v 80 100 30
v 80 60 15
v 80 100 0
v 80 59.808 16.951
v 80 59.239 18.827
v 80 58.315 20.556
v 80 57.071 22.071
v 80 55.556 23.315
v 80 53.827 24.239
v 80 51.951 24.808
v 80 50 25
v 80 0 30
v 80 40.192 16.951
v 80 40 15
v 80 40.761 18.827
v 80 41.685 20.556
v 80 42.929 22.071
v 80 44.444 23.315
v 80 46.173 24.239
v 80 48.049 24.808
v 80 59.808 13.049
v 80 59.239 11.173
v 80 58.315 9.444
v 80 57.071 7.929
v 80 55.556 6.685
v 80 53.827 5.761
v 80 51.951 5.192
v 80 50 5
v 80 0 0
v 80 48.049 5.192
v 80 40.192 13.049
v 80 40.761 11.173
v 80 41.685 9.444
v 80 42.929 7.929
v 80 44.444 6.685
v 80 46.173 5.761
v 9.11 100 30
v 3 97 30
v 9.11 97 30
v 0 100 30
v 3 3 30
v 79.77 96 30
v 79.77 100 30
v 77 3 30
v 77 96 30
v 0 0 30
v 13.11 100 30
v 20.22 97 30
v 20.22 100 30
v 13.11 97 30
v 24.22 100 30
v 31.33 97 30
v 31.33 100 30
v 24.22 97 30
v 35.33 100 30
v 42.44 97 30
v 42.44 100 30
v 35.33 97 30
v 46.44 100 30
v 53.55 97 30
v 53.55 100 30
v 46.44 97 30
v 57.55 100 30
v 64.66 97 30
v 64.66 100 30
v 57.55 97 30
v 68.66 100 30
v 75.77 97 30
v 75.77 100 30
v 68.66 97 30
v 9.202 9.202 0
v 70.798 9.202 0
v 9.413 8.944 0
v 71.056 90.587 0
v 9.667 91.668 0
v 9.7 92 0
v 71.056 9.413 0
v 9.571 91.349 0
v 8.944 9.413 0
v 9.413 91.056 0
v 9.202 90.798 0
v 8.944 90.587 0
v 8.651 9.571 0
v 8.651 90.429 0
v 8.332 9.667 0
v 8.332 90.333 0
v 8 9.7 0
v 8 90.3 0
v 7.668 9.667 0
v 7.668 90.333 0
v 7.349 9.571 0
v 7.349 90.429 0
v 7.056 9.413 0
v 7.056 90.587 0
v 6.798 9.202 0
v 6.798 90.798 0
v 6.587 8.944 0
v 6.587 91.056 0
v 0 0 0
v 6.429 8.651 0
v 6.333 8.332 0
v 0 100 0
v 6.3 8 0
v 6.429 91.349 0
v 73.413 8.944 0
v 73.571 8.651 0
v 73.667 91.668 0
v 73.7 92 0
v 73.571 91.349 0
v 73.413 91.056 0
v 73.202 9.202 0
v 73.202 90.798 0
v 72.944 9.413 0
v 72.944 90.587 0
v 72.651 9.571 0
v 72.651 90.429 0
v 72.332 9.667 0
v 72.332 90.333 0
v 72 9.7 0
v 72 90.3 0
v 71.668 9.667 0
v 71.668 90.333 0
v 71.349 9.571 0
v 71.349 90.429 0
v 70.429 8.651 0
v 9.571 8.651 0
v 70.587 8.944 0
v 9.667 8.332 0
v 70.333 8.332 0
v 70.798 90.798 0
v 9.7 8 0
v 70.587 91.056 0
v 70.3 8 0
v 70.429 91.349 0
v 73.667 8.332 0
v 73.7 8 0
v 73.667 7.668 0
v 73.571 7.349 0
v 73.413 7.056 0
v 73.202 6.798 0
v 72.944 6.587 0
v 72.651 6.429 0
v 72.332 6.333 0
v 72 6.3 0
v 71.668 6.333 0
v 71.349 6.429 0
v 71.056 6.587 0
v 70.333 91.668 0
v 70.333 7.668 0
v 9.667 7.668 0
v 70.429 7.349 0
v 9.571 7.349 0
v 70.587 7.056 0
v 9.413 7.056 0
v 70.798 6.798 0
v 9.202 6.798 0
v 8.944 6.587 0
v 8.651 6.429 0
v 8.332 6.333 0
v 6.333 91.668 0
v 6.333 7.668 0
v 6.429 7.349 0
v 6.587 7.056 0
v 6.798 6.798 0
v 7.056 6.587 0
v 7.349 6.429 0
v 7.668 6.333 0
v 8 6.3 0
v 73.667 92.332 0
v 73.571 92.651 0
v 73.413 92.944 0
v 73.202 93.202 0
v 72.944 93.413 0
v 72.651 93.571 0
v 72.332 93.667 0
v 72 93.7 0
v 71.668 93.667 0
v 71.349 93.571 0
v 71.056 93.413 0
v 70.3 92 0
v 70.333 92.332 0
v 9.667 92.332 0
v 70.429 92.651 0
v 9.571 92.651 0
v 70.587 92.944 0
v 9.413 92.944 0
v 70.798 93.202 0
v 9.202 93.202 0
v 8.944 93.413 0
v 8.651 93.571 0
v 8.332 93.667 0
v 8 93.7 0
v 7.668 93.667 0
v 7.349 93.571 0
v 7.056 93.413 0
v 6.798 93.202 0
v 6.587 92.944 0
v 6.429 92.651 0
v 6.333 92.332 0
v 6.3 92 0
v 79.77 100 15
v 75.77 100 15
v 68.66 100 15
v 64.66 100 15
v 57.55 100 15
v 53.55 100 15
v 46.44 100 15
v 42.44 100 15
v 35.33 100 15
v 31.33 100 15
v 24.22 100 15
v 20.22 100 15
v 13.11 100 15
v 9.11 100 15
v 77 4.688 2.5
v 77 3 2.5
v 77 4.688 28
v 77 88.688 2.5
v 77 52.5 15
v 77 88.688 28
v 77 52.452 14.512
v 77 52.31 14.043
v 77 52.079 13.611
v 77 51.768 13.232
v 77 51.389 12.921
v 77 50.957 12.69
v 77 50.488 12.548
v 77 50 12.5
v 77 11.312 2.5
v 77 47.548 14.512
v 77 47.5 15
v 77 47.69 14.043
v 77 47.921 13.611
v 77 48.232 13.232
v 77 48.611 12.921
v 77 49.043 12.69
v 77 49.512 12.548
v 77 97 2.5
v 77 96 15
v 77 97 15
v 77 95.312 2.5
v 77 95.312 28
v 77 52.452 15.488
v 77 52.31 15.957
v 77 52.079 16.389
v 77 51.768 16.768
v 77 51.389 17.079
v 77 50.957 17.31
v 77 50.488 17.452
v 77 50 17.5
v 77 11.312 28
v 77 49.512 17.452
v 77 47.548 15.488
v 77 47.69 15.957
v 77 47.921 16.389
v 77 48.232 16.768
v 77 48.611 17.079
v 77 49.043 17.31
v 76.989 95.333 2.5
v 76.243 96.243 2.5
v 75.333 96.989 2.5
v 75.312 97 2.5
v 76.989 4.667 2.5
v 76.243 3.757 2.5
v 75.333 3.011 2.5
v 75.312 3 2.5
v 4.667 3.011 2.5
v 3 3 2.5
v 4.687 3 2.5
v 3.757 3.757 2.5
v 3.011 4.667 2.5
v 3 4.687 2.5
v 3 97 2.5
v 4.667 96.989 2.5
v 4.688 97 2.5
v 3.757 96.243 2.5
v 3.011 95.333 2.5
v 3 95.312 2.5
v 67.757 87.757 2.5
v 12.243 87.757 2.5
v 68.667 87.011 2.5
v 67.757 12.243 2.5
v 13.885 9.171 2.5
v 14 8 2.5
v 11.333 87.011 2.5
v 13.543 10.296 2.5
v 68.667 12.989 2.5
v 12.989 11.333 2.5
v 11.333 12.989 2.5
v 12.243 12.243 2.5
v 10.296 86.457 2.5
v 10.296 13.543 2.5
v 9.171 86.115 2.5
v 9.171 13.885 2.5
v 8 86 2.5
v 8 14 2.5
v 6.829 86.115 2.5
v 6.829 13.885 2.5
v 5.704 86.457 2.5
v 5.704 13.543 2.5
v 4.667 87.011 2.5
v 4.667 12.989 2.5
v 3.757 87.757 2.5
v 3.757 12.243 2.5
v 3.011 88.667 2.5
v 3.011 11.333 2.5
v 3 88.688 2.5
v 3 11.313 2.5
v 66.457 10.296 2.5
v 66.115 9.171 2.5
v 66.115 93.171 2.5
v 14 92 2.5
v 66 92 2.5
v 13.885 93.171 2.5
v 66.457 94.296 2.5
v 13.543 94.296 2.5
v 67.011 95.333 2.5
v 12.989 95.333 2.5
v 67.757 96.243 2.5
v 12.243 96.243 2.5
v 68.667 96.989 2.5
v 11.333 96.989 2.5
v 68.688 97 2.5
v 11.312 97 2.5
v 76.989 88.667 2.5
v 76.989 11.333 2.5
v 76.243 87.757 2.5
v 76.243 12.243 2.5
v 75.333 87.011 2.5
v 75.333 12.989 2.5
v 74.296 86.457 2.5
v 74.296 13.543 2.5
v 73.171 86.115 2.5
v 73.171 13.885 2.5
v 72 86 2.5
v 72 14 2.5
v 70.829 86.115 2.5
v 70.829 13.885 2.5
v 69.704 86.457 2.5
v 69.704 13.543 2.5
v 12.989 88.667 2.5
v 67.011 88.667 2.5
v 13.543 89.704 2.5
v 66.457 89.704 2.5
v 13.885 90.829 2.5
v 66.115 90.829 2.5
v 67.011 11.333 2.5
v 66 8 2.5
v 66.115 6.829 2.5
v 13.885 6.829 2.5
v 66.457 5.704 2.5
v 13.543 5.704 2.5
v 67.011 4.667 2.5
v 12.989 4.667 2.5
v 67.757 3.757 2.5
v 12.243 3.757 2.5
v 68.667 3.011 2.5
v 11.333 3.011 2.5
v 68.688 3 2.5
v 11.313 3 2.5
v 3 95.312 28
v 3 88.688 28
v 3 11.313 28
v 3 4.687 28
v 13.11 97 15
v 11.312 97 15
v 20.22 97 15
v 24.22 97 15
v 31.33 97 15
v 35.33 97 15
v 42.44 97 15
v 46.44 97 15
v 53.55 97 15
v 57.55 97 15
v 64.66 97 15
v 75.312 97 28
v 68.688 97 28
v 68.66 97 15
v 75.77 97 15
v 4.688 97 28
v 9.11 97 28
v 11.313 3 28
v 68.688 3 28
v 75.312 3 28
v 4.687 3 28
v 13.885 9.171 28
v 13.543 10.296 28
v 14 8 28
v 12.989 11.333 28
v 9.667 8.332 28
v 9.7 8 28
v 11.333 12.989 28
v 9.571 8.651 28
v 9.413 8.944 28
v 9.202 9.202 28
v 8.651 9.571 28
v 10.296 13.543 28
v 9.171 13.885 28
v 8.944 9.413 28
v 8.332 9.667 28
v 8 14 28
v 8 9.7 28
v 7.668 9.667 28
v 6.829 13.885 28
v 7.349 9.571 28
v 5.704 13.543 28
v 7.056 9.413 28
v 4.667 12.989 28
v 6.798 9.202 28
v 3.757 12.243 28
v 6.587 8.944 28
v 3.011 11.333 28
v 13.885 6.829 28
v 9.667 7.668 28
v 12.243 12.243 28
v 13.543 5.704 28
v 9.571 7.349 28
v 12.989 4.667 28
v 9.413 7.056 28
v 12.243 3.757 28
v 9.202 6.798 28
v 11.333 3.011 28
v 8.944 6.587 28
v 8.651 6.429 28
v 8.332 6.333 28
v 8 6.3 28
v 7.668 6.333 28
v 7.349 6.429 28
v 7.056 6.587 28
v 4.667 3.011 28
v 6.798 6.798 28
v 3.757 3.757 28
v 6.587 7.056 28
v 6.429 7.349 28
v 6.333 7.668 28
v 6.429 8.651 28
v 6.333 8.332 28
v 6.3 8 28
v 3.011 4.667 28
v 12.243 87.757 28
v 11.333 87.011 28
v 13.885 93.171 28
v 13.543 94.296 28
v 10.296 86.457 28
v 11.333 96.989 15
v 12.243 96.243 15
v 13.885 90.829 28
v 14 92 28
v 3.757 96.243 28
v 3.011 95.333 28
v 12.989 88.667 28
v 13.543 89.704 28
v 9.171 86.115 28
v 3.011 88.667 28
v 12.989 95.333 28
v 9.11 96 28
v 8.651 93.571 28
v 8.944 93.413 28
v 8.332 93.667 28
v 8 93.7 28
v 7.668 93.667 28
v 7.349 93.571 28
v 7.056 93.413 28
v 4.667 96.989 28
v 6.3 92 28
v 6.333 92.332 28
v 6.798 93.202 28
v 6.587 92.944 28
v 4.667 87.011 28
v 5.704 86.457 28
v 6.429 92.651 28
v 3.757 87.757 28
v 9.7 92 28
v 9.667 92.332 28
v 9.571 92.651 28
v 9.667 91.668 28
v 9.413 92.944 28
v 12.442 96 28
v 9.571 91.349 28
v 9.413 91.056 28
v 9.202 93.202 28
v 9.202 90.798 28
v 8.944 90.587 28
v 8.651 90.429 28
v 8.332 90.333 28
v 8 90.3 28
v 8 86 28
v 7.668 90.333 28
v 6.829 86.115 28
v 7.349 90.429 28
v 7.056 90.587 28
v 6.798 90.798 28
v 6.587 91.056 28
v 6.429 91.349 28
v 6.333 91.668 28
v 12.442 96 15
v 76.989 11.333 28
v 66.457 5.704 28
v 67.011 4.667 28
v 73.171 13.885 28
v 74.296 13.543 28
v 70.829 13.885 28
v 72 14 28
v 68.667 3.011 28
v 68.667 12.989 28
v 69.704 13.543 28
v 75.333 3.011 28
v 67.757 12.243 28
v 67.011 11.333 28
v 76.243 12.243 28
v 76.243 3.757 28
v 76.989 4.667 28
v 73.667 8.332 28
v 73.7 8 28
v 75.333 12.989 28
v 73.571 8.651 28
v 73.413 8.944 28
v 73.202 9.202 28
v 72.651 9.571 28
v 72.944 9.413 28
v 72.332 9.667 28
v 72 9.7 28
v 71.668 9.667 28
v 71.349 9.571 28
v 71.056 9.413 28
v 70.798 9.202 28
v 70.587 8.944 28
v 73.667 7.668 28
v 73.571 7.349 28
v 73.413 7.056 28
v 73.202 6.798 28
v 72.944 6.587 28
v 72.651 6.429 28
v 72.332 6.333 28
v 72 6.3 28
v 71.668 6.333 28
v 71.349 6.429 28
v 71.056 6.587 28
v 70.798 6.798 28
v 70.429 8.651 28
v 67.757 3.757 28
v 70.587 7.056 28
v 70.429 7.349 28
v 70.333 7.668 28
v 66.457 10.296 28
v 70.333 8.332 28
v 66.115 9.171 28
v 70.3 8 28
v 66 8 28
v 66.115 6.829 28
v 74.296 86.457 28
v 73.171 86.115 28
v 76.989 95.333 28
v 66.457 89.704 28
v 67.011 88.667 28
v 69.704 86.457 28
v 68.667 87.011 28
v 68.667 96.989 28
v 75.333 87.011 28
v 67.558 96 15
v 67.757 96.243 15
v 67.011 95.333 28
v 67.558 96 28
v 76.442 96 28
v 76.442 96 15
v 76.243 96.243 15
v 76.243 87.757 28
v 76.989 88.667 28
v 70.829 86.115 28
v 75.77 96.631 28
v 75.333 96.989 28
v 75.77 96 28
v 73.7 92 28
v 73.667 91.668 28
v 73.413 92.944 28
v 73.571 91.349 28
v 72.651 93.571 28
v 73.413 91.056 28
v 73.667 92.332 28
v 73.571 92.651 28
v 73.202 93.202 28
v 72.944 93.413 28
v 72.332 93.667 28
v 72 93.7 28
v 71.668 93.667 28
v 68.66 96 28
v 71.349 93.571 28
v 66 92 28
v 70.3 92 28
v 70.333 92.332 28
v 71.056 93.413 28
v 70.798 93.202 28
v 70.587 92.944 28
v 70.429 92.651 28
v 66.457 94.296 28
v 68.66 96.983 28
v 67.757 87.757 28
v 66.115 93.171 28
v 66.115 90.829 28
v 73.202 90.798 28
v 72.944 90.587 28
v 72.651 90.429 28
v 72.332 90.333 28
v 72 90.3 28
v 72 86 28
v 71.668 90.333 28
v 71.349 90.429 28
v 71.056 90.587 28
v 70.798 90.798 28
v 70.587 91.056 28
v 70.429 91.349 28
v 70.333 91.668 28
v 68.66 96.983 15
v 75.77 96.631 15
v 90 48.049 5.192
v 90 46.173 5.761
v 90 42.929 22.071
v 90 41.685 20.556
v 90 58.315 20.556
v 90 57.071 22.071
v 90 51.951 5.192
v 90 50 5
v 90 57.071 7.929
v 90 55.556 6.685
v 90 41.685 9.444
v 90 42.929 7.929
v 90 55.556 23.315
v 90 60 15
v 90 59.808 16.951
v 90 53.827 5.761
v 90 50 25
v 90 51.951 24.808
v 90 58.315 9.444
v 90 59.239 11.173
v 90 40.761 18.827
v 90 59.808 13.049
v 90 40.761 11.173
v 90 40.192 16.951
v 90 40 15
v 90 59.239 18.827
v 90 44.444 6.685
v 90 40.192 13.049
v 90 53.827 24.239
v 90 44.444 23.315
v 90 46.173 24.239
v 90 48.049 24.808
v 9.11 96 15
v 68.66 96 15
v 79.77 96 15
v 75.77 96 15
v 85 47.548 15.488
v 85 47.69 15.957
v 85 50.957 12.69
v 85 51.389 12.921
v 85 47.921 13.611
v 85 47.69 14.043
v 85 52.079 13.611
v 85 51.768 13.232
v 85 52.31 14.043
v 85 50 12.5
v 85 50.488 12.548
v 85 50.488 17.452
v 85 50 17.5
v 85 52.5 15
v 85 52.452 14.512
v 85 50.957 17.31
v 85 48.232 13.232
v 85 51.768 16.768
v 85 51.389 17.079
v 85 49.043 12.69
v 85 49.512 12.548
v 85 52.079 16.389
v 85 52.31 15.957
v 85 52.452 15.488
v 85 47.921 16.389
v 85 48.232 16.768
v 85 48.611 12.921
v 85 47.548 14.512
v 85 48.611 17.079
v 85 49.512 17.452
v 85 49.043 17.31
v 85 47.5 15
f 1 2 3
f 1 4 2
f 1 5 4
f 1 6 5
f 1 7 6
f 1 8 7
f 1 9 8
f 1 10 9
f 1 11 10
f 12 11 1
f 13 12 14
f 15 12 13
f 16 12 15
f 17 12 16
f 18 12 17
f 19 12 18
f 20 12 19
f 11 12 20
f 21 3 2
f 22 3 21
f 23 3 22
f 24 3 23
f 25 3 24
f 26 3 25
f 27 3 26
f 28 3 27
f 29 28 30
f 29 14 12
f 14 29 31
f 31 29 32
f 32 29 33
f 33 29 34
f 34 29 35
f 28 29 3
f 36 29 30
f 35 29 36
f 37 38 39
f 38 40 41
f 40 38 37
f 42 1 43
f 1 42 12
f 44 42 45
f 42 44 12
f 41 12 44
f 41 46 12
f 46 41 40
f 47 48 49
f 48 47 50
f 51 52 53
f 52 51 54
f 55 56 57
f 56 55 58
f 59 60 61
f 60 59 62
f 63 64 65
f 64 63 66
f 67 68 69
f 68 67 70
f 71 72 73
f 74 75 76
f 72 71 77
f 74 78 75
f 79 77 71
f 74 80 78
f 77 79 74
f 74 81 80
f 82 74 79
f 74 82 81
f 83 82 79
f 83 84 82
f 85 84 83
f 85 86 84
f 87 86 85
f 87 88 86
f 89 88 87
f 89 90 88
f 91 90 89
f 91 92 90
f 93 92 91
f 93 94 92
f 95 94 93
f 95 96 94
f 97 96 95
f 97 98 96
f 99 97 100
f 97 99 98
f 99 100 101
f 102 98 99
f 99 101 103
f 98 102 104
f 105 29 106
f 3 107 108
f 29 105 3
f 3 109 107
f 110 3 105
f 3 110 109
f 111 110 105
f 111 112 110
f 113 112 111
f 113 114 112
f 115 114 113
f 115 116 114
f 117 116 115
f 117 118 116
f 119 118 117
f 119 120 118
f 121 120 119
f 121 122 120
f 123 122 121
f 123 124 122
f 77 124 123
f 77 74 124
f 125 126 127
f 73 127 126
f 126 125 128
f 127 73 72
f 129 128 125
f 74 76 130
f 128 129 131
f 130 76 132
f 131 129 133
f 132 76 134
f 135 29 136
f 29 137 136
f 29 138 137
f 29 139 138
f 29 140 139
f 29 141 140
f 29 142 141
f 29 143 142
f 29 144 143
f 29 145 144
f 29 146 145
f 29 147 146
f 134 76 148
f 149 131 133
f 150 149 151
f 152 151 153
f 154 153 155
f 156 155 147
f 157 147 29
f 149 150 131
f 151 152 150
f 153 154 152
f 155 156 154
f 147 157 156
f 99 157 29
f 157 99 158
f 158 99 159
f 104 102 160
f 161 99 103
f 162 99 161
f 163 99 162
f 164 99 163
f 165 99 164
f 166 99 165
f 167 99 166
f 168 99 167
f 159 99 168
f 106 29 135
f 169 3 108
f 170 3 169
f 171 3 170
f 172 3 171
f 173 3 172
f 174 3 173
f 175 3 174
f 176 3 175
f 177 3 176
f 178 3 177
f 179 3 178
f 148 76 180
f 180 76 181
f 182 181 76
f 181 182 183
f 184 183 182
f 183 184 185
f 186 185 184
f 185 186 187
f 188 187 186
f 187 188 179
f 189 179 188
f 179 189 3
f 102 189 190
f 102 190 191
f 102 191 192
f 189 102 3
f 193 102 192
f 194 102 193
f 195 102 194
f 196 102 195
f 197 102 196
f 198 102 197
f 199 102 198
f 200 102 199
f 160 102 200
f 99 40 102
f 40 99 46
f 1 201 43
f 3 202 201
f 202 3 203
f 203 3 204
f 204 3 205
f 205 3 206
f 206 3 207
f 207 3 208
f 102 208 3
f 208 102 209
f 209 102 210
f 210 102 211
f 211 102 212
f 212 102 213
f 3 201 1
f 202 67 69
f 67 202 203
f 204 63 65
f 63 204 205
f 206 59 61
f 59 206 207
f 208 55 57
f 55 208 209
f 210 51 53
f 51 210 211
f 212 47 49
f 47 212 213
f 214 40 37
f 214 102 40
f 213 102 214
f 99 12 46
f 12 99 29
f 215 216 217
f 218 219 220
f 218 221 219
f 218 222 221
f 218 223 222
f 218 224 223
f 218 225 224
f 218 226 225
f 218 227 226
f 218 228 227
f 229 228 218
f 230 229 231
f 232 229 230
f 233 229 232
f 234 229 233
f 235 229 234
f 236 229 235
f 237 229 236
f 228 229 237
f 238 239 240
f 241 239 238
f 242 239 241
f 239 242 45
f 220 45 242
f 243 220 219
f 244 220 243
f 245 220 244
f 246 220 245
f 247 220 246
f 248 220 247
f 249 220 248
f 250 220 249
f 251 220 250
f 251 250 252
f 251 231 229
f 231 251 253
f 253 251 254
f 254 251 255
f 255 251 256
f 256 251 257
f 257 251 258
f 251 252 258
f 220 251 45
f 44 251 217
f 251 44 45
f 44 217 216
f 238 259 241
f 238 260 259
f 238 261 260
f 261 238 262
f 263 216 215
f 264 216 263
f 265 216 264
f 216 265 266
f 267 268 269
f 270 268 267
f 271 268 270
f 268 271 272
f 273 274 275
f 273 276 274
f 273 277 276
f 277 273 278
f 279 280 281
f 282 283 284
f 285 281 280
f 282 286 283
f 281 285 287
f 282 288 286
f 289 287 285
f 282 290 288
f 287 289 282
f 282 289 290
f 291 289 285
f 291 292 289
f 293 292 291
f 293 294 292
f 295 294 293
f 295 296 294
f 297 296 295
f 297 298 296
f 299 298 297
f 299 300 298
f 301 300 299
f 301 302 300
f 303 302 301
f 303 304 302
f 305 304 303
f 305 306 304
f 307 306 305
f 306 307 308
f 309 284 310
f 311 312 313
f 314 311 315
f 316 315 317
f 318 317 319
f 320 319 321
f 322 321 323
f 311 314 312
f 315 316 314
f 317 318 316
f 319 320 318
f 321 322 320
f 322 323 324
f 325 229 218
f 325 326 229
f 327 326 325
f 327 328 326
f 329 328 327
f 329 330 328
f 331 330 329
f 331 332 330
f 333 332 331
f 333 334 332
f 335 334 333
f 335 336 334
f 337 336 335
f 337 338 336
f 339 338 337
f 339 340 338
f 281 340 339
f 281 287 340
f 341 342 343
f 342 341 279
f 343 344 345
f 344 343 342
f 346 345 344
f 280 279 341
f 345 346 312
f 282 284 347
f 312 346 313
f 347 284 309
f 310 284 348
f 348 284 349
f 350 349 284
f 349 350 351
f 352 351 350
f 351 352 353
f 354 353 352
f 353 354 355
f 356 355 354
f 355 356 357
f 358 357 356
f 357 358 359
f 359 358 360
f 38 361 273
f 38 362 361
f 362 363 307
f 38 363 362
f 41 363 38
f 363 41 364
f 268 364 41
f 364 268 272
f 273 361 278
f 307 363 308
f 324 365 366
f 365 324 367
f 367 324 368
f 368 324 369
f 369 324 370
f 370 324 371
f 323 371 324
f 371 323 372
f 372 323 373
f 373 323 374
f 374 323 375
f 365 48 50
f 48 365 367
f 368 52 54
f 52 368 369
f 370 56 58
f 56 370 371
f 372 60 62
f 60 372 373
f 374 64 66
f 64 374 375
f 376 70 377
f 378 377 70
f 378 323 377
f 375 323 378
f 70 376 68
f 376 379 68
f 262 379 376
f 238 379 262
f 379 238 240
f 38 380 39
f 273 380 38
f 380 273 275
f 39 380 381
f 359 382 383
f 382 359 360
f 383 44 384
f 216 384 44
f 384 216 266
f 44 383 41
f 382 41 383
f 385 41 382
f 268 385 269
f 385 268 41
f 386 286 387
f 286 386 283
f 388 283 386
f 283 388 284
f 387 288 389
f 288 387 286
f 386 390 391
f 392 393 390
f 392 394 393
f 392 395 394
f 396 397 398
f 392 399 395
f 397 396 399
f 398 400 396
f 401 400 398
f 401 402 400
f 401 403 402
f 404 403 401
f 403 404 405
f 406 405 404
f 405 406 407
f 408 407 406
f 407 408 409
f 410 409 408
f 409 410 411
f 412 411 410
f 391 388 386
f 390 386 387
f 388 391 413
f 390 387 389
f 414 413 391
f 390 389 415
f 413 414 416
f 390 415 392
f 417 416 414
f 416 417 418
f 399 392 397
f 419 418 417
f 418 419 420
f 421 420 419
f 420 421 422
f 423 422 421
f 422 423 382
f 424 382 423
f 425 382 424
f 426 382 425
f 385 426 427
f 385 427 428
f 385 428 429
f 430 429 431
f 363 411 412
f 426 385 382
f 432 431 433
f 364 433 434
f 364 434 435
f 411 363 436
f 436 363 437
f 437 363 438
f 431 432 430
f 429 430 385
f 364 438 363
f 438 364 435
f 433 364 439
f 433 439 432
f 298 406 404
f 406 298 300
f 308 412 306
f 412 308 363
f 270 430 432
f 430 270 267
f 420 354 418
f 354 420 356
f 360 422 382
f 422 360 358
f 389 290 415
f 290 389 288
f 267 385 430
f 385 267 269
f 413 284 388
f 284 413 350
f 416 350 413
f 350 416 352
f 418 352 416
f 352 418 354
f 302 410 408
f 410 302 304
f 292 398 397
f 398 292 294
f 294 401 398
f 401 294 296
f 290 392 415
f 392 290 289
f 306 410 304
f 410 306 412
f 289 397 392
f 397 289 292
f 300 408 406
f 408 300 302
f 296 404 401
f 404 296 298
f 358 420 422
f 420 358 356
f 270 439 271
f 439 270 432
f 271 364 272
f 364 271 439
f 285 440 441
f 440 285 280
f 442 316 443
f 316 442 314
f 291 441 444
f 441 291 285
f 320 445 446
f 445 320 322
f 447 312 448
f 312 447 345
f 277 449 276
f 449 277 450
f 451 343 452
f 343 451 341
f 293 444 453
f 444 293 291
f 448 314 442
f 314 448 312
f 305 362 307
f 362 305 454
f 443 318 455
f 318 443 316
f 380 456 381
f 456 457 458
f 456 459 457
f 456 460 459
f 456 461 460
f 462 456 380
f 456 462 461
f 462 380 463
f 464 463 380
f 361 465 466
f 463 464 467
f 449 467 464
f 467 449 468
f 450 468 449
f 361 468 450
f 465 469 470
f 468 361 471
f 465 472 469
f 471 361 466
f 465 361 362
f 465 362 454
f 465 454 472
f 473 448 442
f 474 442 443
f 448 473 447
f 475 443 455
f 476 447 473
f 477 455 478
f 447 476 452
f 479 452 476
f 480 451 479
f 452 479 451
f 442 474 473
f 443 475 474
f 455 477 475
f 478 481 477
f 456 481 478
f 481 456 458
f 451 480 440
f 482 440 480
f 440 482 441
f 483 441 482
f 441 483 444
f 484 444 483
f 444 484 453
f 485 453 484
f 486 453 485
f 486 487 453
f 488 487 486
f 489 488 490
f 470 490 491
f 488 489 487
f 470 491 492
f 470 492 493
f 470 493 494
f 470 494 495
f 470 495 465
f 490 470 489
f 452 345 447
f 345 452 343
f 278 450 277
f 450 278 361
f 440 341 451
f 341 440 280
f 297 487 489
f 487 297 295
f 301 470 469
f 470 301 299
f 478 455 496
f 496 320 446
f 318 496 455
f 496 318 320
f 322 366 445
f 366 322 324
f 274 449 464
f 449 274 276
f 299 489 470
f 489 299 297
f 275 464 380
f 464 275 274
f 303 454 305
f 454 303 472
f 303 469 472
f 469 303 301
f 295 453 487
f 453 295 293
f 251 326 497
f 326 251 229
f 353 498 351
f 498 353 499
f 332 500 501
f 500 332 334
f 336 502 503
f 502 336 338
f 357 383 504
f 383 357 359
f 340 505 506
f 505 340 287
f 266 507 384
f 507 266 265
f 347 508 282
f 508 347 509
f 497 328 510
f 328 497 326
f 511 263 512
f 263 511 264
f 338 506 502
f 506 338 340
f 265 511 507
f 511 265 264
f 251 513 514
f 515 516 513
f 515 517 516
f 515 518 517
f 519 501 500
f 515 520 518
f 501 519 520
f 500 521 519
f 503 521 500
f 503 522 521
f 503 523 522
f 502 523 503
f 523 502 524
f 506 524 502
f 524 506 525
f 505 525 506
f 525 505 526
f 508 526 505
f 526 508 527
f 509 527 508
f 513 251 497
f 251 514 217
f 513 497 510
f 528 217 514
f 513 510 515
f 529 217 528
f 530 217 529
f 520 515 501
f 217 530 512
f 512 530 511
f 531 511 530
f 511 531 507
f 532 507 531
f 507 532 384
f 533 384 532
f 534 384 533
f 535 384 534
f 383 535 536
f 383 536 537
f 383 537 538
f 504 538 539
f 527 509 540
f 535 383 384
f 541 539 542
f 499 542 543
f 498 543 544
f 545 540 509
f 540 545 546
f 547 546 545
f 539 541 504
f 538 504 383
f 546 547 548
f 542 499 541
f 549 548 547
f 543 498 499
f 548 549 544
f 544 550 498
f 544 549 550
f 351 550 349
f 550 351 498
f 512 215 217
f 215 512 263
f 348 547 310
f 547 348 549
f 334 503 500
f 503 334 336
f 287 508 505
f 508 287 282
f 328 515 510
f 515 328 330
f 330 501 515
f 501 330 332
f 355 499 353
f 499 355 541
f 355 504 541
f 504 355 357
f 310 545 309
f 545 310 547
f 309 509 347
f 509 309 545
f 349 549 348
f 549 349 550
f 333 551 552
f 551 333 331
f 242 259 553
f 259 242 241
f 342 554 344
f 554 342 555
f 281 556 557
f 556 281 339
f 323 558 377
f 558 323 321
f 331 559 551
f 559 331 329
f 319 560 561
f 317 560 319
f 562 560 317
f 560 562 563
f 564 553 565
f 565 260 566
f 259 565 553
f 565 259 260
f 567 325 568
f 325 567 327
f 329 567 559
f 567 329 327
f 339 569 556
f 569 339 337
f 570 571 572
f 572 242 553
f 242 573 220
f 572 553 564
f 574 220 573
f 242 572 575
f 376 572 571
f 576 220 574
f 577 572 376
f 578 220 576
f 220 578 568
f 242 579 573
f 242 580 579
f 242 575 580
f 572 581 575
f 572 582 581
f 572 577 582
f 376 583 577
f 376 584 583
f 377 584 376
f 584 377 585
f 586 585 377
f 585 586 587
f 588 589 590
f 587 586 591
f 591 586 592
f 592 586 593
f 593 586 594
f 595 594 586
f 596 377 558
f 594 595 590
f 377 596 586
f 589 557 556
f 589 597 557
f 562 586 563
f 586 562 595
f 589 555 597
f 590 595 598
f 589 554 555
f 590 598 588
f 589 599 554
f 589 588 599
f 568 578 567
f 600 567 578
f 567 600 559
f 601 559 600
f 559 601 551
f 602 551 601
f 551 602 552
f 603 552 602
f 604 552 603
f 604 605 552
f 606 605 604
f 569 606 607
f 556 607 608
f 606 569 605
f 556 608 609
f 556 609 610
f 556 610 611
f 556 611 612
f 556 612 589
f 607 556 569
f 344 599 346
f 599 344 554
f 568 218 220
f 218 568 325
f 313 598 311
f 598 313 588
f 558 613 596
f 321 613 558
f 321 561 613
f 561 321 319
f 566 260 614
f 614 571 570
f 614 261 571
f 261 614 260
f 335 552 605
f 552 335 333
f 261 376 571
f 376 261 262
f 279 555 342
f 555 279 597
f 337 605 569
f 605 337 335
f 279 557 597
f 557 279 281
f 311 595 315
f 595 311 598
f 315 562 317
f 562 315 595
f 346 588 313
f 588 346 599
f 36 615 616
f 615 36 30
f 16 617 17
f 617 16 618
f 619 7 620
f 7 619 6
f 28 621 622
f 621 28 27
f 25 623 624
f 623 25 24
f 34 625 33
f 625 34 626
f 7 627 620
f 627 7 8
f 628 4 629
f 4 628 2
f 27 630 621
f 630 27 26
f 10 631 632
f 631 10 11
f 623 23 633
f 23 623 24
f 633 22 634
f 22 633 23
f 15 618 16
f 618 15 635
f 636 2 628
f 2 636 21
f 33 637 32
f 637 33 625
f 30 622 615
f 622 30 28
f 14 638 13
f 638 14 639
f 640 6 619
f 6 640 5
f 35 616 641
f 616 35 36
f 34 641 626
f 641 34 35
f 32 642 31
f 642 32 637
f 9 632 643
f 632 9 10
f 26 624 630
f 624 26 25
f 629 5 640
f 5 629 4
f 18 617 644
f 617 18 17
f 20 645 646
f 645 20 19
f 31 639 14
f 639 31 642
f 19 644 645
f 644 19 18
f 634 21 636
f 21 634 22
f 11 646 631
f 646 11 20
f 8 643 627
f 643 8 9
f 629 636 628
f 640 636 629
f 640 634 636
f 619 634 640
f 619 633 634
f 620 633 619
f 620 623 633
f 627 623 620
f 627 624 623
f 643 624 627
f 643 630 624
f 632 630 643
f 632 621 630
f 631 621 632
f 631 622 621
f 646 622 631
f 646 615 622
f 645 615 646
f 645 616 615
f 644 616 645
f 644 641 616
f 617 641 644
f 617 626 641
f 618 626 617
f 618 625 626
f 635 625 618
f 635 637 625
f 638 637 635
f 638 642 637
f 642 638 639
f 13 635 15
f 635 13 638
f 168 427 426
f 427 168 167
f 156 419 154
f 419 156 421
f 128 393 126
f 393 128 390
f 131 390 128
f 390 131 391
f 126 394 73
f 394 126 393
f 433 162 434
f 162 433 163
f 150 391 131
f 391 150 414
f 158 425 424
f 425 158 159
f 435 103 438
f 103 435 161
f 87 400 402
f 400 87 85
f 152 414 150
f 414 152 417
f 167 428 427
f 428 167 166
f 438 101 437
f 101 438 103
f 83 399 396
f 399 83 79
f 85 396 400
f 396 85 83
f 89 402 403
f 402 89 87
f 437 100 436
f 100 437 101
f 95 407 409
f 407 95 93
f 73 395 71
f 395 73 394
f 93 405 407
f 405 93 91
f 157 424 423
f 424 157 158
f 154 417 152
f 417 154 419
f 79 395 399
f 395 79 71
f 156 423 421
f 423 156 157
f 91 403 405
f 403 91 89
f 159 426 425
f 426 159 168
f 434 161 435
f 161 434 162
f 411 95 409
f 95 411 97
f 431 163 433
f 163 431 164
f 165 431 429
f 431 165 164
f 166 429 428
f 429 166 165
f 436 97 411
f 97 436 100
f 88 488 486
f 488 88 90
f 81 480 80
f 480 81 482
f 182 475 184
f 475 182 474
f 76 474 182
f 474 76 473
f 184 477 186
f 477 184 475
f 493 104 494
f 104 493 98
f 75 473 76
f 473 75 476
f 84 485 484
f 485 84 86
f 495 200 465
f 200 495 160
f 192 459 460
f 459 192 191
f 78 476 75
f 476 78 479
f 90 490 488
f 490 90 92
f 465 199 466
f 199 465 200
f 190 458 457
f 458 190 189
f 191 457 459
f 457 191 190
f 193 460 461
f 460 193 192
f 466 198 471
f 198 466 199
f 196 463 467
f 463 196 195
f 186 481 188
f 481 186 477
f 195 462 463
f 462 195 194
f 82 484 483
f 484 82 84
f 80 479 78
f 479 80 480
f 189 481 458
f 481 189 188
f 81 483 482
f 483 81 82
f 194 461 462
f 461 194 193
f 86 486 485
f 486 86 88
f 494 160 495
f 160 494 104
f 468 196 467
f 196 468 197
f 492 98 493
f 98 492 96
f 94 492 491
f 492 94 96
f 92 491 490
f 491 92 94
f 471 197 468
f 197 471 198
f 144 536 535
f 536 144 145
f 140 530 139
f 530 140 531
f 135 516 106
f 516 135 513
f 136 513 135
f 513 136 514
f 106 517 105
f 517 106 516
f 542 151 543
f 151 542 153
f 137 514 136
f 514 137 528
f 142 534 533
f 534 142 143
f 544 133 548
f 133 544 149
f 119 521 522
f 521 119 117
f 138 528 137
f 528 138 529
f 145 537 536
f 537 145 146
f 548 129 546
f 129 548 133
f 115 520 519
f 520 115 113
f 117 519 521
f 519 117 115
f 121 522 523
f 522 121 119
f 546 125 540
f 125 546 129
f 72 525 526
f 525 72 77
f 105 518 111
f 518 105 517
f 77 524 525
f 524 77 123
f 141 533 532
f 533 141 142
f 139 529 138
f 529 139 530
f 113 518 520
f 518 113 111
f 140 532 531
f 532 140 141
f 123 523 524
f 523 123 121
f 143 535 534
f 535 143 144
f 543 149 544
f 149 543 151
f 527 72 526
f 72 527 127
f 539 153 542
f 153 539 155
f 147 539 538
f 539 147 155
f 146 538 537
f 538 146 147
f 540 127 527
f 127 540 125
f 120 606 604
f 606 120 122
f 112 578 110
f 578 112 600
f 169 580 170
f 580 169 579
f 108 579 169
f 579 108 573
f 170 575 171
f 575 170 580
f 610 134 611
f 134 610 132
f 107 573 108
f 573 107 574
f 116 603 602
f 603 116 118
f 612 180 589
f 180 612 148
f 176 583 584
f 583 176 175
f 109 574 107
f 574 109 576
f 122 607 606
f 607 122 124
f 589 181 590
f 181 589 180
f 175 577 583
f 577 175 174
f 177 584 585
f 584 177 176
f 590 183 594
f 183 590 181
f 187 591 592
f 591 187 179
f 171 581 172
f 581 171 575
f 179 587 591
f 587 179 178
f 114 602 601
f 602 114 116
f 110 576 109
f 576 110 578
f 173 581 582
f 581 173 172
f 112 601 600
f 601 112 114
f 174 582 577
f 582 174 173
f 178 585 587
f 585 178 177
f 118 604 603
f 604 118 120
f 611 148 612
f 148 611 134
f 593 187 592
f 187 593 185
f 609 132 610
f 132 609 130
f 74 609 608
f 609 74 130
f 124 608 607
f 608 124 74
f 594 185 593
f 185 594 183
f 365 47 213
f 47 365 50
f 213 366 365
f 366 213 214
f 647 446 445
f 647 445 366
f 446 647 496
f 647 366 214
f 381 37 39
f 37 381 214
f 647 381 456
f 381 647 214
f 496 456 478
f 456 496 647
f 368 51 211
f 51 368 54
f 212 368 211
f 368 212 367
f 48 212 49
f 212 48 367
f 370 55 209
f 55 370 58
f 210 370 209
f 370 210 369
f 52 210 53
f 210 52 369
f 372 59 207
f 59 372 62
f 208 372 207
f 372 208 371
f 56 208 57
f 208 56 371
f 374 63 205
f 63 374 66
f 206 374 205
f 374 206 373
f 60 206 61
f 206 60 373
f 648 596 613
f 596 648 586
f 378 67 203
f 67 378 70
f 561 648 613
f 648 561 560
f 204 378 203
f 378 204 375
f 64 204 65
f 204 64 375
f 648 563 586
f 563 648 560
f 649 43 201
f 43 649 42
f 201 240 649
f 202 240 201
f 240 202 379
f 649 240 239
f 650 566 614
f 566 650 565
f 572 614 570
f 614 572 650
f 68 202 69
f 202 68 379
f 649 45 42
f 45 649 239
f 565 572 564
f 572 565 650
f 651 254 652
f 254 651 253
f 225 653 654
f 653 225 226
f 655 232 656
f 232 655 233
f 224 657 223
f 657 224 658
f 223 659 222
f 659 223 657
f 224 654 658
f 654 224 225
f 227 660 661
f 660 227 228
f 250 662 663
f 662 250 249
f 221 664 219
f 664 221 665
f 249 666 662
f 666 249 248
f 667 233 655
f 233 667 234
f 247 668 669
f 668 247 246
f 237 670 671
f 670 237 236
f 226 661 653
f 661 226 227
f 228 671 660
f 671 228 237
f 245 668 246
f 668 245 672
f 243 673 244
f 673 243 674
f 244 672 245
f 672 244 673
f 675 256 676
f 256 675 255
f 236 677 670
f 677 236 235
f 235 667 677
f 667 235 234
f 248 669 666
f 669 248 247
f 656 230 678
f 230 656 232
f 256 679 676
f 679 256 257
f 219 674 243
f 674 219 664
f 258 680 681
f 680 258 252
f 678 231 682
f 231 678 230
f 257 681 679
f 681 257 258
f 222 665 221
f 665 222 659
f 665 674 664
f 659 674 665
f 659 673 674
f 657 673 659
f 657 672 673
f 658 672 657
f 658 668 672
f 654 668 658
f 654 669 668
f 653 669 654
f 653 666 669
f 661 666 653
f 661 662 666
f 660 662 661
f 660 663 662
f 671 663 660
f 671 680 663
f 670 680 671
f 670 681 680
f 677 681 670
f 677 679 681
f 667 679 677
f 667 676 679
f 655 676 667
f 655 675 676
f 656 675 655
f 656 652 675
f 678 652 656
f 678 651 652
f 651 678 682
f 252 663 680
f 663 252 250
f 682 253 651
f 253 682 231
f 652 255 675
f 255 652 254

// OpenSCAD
$fn = 32;

// ----------------------------------------------------------------------
// Enclosure body: 80 x 100 x 30 mm, wall 3 mm
// ----------------------------------------------------------------------

// --- parameters (mm) ---
length = 80;              // outside length, X
width = 100;              // outside width, Y
height = 30;              // outside height, Z
wall = 3;                 // side wall thickness
floor_t = 2.5;            // floor thickness
boss_d = 12;              // corner boss diameter
boss_h = 25.5;            // corner boss height above the floor
boss_hole_d = 3.4;        // lid screw clearance in the boss
boss_lip = 8;             // boss centre inset from the corner
vent_slots = 8;           // vent slots in the long wall
vent_w = 4;               // vent slot width
vent_h = 16;              // vent slot height
vent_pitch = 11.11;       // vent slot pitch
vent_z = 15;              // vent slot sill height
nipple_d = 20;            // cable gland boss diameter
nipple_h = 10;            // cable gland boss height
nipple_bore = 5;          // cable gland bore

module shell() {
  difference() {
    cube([length, width, height]);
    /* hollow, open at the top */
    translate([wall, wall, floor_t])
      cube([length - 2 * wall, width - 2 * wall, height]);
  }
}

module bosses() {
  /* corner bosses, sunk 1 mm into the floor */
  for (sx = [0, 1]) for (sy = [0, 1])
    translate([sx * (length - 2 * boss_lip) + boss_lip, sy * (width - 2 * boss_lip) + boss_lip, floor_t - 1])
      cylinder(h = boss_h + 1, d = boss_d);
}

module gland() {
  /* boss on the short wall, sunk 1 mm into it */
  translate([length - 1, width / 2, height * 0.5]) rotate([0, 90, 0])
    cylinder(h = nipple_h + 1, d = nipple_d);
}

difference() {
  union() {
    shell();
    bosses();
    gland();
  }
  /* boss screw holes */
  for (sx = [0, 1]) for (sy = [0, 1])
    translate([sx * (length - 2 * boss_lip) + boss_lip, sy * (width - 2 * boss_lip) + boss_lip, -1]) cylinder(h = floor_t + boss_h + 2, d = boss_hole_d);
  /* vent grille in the +Y wall */
  for (i = [0 : vent_slots - 1]) translate([vent_pitch * (i + 1) - vent_w / 2, width - wall - 1, vent_z]) cube([vent_w, wall + 2, vent_h]);
  translate([length, width / 2, height * 0.5]) rotate([0, 90, 0]) translate([0, 0, -nipple_h - 2]) cylinder(h = nipple_h + wall + 4, d = nipple_bore);
}
